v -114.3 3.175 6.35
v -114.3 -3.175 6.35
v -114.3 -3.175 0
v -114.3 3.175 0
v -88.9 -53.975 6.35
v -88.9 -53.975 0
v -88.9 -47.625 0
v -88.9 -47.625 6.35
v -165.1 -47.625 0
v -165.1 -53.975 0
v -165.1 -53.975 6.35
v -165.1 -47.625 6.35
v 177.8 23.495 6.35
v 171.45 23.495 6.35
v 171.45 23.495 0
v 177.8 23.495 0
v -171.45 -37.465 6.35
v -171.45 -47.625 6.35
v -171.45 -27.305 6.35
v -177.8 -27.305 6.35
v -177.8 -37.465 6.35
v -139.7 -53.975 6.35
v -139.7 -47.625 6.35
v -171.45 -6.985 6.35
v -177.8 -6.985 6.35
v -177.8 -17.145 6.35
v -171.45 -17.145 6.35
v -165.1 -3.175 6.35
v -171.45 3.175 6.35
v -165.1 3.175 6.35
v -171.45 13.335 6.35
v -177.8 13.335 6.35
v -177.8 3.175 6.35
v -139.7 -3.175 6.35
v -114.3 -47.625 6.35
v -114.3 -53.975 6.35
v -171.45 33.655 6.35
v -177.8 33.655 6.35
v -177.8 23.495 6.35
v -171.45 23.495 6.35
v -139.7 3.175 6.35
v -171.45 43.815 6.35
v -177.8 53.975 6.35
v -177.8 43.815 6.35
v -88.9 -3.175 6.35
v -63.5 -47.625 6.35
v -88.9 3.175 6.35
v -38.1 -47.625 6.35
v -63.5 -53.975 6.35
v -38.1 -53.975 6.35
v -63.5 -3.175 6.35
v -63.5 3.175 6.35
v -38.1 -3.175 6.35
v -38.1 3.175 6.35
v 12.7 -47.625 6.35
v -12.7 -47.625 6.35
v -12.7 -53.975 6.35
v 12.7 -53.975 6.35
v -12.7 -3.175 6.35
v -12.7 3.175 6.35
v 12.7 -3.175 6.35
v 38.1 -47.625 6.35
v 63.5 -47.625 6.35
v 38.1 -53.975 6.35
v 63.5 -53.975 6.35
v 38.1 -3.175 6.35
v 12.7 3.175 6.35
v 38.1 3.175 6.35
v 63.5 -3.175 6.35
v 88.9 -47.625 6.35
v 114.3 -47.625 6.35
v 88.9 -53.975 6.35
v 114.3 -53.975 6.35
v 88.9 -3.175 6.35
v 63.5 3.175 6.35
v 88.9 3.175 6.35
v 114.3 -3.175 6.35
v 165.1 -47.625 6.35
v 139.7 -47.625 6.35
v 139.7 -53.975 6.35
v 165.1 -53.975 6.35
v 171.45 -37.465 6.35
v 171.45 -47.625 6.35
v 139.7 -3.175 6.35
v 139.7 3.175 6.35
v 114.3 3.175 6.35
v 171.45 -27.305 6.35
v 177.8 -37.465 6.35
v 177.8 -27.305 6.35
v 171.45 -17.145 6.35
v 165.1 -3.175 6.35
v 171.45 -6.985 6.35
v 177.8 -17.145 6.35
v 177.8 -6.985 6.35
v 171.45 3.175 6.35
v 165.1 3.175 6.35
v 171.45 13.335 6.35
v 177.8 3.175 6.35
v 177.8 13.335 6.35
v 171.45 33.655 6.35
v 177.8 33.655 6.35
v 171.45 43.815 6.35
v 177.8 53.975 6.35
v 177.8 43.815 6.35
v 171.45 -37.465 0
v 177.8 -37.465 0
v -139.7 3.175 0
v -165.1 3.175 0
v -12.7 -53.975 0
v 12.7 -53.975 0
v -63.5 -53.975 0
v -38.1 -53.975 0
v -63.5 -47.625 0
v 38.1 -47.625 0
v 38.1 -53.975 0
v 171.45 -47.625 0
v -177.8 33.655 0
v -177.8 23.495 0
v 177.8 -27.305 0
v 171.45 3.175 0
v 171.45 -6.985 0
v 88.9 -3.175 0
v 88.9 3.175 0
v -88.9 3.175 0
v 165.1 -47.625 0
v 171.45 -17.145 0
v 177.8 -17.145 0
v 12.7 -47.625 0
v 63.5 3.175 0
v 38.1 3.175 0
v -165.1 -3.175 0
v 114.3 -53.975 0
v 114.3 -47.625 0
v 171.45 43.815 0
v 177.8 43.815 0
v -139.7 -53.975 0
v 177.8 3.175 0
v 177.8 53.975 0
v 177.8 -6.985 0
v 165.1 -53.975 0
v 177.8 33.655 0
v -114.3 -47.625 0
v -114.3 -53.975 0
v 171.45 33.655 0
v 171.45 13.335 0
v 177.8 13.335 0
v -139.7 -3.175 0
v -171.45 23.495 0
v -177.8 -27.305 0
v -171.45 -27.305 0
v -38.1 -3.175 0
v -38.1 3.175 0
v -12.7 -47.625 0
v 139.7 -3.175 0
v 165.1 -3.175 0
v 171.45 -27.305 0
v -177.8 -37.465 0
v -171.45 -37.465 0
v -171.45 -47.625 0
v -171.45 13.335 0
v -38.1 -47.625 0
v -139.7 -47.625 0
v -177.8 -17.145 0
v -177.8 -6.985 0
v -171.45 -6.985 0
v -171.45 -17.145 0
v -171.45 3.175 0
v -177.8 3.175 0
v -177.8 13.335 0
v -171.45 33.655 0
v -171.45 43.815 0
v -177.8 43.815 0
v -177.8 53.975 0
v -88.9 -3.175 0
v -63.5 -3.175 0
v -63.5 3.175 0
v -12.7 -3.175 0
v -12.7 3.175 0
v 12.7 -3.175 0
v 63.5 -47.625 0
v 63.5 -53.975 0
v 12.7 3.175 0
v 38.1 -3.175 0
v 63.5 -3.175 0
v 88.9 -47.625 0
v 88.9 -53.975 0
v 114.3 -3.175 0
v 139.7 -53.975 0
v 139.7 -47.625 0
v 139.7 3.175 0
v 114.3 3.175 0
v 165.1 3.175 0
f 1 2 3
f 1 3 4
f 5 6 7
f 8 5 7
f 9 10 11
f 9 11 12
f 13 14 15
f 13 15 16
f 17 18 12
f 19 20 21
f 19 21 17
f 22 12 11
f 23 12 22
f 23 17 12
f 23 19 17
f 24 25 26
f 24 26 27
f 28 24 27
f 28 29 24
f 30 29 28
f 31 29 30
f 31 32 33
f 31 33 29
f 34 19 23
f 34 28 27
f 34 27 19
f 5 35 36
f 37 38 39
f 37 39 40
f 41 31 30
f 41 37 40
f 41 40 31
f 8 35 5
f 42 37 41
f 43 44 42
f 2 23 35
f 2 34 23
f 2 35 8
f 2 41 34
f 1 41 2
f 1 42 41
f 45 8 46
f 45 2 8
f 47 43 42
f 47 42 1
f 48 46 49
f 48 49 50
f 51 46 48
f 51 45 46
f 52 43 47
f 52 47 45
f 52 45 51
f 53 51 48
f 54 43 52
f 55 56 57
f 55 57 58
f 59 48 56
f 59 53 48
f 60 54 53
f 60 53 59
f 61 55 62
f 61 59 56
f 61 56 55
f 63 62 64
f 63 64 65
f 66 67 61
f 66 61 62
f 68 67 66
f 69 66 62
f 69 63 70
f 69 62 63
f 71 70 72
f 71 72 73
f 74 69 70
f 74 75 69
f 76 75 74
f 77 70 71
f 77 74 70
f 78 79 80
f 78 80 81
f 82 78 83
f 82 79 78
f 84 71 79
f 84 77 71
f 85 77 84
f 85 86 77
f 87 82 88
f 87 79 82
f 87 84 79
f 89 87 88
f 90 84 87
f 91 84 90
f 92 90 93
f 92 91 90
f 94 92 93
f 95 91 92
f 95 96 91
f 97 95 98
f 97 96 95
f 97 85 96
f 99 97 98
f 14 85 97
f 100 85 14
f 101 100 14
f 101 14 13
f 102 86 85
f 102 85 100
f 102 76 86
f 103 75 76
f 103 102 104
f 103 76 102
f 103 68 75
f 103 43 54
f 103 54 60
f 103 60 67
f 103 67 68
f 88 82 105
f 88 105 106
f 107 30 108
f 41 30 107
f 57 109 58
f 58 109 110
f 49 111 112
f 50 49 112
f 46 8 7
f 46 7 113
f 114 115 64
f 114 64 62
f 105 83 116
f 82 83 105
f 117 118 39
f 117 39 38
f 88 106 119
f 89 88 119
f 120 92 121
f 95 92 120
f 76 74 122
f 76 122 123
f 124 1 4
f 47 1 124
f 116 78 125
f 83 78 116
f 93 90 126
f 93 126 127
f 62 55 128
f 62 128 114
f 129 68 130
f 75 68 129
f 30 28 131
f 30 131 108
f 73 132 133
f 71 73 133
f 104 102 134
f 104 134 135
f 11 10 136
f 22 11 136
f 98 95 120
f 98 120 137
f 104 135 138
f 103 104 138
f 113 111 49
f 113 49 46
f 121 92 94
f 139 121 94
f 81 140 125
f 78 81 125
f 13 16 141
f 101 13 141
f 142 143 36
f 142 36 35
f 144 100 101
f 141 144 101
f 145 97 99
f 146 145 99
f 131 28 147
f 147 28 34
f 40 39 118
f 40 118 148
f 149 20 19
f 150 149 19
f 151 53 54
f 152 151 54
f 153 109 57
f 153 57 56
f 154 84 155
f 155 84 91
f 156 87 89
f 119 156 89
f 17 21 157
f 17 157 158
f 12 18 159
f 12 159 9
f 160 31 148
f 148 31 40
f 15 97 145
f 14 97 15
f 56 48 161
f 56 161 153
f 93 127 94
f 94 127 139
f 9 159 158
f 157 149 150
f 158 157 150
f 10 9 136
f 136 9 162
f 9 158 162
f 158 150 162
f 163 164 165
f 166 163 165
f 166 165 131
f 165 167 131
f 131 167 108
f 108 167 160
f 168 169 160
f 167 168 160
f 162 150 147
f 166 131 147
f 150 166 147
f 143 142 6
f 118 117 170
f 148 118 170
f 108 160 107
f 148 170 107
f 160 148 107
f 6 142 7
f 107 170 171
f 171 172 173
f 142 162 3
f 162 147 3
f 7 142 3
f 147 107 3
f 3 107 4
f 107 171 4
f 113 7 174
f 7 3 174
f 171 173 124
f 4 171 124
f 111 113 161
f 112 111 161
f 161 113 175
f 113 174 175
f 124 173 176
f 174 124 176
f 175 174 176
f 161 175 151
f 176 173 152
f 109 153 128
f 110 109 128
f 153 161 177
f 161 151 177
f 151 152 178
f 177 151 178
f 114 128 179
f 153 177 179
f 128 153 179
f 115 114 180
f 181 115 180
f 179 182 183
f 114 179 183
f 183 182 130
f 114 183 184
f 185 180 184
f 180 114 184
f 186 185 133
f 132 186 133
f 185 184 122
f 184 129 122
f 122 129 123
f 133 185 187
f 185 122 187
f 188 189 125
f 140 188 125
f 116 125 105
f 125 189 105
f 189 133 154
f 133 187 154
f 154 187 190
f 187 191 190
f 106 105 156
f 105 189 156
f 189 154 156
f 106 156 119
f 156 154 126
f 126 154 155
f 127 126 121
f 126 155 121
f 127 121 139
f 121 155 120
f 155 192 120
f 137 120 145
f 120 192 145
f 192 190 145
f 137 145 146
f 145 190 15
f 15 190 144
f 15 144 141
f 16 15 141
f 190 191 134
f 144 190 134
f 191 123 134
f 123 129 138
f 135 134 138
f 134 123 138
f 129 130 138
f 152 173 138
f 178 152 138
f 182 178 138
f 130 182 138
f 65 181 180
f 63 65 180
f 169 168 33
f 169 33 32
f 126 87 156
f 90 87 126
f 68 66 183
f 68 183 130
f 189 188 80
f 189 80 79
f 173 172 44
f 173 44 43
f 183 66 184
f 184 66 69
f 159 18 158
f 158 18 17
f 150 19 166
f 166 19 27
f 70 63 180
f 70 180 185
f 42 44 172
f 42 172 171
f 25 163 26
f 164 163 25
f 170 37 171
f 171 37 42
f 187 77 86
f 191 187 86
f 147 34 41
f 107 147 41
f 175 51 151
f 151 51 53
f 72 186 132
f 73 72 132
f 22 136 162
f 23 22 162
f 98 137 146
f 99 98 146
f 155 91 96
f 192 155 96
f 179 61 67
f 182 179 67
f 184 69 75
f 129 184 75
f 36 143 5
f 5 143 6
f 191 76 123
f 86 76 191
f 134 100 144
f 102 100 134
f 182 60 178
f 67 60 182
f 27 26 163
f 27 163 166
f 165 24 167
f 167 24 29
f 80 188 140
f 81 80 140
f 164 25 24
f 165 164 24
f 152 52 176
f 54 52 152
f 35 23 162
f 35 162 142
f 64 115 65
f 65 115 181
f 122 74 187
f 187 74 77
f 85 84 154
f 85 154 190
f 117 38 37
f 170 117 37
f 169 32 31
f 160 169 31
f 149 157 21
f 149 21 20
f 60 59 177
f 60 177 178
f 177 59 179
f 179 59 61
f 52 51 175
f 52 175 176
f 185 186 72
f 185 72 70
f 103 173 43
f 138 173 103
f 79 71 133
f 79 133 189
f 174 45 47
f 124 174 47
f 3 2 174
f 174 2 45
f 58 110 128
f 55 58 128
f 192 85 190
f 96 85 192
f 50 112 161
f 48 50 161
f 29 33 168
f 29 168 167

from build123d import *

# Parameters (mm, degrees)
ESQUISSE1_W                     = 355.6
ESQUISSE1_H                     = 107.95
BOSS_EXTRU_1_DEPTH              = 6.35
ESQUISSE4_W                     = 6.35
ESQUISSE4_H                     = 10.16
ENL_V_MAT_EXTRU_3_DEPTH         = 6.35
R_P_TITION_LIN_AIRE2_COUNT      = 5
R_P_TITION_LIN_AIRE2_PITCH      = 20.32
R_P_TITION_LIN_AIRE2_COUNT_DIR2 = 2
R_P_TITION_LIN_AIRE2_PITCH_DIR2 = 349.25
ESQUISSE5_W                     = 25.4
ESQUISSE5_H                     = 6.35
ENL_V_MAT_EXTRU_4_DEPTH         = 6.35
R_P_TITION_LIN_AIRE3_COUNT      = 7
R_P_TITION_LIN_AIRE3_PITCH      = 50.8
ESQUISSE6_W                     = 12.7
ESQUISSE6_H                     = 6.35
ENL_V_MAT_EXTRU_5_DEPTH         = 6.35
ESQUISSE7_W                     = 25.4
ESQUISSE7_H                     = 6.35
ENL_V_MAT_EXTRU_6_DEPTH         = 6.35
R_P_TITION_LIN_AIRE5_COUNT      = 7
R_P_TITION_LIN_AIRE5_PITCH      = 50.8


with BuildPart() as part:
    # Esquisse1 → Boss.-Extru.1 (new body)
    with BuildSketch(Plane.XY):
        Rectangle(ESQUISSE1_W, ESQUISSE1_H)
    extrude(amount=BOSS_EXTRU_1_DEPTH)

    # Esquisse4 → Enlèv. mat.-Extru.3 (cut)
    with BuildSketch(Plane.XY.offset(6.35)):
        with Locations((-174.625, 38.735)):
            Rectangle(ESQUISSE4_W, ESQUISSE4_H)
    enl_v_mat_extru_3 = extrude(amount=-ENL_V_MAT_EXTRU_3_DEPTH, mode=Mode.SUBTRACT)

    # Répétition linéaire2: Enl_v. mat.-Extru.3 5 × 2
    with Locations(*[(j * R_P_TITION_LIN_AIRE2_PITCH_DIR2, -i * R_P_TITION_LIN_AIRE2_PITCH, 0) for i in range(R_P_TITION_LIN_AIRE2_COUNT) for j in range(R_P_TITION_LIN_AIRE2_COUNT_DIR2) if (i, j) != (0, 0)]):
        add(enl_v_mat_extru_3, mode=Mode.SUBTRACT)

    # Esquisse5 → Enlèv. mat.-Extru.4 (cut)
    with BuildSketch(Plane.XY.offset(6.35)):
        with Locations((-127, -50.8)):
            Rectangle(ESQUISSE5_W, ESQUISSE5_H)
    enl_v_mat_extru_4 = extrude(amount=-ENL_V_MAT_EXTRU_4_DEPTH, mode=Mode.SUBTRACT)

    # Répétition linéaire3: Enlèv. mat.-Extru.4 ×7
    with Locations(*[(i * R_P_TITION_LIN_AIRE3_PITCH, 0, 0) for i in range(1, R_P_TITION_LIN_AIRE3_COUNT)]):
        add(enl_v_mat_extru_4, mode=Mode.SUBTRACT)

    # Esquisse6 → Enlèv. mat.-Extru.5 (cut)
    with BuildSketch(Plane.XY.offset(6.35)):
        with Locations((-171.45, -50.8)):
            Rectangle(ESQUISSE6_W, ESQUISSE6_H)
    extrude(amount=-ENL_V_MAT_EXTRU_5_DEPTH, mode=Mode.SUBTRACT)

    # Esquisse7 → Enlèv. mat.-Extru.6 (cut)
    with BuildSketch(Plane.XY.offset(6.35)):
        with Locations((-152.4, 0)):
            Rectangle(ESQUISSE7_W, ESQUISSE7_H)
    enl_v_mat_extru_6 = extrude(amount=-ENL_V_MAT_EXTRU_6_DEPTH, mode=Mode.SUBTRACT)

    # Répétition linéaire5: Enlèv. mat.-Extru.6 ×7
    with Locations(*[(i * R_P_TITION_LIN_AIRE5_PITCH, 0, 0) for i in range(1, R_P_TITION_LIN_AIRE5_COUNT)]):
        add(enl_v_mat_extru_6, mode=Mode.SUBTRACT)


solid = part.part
